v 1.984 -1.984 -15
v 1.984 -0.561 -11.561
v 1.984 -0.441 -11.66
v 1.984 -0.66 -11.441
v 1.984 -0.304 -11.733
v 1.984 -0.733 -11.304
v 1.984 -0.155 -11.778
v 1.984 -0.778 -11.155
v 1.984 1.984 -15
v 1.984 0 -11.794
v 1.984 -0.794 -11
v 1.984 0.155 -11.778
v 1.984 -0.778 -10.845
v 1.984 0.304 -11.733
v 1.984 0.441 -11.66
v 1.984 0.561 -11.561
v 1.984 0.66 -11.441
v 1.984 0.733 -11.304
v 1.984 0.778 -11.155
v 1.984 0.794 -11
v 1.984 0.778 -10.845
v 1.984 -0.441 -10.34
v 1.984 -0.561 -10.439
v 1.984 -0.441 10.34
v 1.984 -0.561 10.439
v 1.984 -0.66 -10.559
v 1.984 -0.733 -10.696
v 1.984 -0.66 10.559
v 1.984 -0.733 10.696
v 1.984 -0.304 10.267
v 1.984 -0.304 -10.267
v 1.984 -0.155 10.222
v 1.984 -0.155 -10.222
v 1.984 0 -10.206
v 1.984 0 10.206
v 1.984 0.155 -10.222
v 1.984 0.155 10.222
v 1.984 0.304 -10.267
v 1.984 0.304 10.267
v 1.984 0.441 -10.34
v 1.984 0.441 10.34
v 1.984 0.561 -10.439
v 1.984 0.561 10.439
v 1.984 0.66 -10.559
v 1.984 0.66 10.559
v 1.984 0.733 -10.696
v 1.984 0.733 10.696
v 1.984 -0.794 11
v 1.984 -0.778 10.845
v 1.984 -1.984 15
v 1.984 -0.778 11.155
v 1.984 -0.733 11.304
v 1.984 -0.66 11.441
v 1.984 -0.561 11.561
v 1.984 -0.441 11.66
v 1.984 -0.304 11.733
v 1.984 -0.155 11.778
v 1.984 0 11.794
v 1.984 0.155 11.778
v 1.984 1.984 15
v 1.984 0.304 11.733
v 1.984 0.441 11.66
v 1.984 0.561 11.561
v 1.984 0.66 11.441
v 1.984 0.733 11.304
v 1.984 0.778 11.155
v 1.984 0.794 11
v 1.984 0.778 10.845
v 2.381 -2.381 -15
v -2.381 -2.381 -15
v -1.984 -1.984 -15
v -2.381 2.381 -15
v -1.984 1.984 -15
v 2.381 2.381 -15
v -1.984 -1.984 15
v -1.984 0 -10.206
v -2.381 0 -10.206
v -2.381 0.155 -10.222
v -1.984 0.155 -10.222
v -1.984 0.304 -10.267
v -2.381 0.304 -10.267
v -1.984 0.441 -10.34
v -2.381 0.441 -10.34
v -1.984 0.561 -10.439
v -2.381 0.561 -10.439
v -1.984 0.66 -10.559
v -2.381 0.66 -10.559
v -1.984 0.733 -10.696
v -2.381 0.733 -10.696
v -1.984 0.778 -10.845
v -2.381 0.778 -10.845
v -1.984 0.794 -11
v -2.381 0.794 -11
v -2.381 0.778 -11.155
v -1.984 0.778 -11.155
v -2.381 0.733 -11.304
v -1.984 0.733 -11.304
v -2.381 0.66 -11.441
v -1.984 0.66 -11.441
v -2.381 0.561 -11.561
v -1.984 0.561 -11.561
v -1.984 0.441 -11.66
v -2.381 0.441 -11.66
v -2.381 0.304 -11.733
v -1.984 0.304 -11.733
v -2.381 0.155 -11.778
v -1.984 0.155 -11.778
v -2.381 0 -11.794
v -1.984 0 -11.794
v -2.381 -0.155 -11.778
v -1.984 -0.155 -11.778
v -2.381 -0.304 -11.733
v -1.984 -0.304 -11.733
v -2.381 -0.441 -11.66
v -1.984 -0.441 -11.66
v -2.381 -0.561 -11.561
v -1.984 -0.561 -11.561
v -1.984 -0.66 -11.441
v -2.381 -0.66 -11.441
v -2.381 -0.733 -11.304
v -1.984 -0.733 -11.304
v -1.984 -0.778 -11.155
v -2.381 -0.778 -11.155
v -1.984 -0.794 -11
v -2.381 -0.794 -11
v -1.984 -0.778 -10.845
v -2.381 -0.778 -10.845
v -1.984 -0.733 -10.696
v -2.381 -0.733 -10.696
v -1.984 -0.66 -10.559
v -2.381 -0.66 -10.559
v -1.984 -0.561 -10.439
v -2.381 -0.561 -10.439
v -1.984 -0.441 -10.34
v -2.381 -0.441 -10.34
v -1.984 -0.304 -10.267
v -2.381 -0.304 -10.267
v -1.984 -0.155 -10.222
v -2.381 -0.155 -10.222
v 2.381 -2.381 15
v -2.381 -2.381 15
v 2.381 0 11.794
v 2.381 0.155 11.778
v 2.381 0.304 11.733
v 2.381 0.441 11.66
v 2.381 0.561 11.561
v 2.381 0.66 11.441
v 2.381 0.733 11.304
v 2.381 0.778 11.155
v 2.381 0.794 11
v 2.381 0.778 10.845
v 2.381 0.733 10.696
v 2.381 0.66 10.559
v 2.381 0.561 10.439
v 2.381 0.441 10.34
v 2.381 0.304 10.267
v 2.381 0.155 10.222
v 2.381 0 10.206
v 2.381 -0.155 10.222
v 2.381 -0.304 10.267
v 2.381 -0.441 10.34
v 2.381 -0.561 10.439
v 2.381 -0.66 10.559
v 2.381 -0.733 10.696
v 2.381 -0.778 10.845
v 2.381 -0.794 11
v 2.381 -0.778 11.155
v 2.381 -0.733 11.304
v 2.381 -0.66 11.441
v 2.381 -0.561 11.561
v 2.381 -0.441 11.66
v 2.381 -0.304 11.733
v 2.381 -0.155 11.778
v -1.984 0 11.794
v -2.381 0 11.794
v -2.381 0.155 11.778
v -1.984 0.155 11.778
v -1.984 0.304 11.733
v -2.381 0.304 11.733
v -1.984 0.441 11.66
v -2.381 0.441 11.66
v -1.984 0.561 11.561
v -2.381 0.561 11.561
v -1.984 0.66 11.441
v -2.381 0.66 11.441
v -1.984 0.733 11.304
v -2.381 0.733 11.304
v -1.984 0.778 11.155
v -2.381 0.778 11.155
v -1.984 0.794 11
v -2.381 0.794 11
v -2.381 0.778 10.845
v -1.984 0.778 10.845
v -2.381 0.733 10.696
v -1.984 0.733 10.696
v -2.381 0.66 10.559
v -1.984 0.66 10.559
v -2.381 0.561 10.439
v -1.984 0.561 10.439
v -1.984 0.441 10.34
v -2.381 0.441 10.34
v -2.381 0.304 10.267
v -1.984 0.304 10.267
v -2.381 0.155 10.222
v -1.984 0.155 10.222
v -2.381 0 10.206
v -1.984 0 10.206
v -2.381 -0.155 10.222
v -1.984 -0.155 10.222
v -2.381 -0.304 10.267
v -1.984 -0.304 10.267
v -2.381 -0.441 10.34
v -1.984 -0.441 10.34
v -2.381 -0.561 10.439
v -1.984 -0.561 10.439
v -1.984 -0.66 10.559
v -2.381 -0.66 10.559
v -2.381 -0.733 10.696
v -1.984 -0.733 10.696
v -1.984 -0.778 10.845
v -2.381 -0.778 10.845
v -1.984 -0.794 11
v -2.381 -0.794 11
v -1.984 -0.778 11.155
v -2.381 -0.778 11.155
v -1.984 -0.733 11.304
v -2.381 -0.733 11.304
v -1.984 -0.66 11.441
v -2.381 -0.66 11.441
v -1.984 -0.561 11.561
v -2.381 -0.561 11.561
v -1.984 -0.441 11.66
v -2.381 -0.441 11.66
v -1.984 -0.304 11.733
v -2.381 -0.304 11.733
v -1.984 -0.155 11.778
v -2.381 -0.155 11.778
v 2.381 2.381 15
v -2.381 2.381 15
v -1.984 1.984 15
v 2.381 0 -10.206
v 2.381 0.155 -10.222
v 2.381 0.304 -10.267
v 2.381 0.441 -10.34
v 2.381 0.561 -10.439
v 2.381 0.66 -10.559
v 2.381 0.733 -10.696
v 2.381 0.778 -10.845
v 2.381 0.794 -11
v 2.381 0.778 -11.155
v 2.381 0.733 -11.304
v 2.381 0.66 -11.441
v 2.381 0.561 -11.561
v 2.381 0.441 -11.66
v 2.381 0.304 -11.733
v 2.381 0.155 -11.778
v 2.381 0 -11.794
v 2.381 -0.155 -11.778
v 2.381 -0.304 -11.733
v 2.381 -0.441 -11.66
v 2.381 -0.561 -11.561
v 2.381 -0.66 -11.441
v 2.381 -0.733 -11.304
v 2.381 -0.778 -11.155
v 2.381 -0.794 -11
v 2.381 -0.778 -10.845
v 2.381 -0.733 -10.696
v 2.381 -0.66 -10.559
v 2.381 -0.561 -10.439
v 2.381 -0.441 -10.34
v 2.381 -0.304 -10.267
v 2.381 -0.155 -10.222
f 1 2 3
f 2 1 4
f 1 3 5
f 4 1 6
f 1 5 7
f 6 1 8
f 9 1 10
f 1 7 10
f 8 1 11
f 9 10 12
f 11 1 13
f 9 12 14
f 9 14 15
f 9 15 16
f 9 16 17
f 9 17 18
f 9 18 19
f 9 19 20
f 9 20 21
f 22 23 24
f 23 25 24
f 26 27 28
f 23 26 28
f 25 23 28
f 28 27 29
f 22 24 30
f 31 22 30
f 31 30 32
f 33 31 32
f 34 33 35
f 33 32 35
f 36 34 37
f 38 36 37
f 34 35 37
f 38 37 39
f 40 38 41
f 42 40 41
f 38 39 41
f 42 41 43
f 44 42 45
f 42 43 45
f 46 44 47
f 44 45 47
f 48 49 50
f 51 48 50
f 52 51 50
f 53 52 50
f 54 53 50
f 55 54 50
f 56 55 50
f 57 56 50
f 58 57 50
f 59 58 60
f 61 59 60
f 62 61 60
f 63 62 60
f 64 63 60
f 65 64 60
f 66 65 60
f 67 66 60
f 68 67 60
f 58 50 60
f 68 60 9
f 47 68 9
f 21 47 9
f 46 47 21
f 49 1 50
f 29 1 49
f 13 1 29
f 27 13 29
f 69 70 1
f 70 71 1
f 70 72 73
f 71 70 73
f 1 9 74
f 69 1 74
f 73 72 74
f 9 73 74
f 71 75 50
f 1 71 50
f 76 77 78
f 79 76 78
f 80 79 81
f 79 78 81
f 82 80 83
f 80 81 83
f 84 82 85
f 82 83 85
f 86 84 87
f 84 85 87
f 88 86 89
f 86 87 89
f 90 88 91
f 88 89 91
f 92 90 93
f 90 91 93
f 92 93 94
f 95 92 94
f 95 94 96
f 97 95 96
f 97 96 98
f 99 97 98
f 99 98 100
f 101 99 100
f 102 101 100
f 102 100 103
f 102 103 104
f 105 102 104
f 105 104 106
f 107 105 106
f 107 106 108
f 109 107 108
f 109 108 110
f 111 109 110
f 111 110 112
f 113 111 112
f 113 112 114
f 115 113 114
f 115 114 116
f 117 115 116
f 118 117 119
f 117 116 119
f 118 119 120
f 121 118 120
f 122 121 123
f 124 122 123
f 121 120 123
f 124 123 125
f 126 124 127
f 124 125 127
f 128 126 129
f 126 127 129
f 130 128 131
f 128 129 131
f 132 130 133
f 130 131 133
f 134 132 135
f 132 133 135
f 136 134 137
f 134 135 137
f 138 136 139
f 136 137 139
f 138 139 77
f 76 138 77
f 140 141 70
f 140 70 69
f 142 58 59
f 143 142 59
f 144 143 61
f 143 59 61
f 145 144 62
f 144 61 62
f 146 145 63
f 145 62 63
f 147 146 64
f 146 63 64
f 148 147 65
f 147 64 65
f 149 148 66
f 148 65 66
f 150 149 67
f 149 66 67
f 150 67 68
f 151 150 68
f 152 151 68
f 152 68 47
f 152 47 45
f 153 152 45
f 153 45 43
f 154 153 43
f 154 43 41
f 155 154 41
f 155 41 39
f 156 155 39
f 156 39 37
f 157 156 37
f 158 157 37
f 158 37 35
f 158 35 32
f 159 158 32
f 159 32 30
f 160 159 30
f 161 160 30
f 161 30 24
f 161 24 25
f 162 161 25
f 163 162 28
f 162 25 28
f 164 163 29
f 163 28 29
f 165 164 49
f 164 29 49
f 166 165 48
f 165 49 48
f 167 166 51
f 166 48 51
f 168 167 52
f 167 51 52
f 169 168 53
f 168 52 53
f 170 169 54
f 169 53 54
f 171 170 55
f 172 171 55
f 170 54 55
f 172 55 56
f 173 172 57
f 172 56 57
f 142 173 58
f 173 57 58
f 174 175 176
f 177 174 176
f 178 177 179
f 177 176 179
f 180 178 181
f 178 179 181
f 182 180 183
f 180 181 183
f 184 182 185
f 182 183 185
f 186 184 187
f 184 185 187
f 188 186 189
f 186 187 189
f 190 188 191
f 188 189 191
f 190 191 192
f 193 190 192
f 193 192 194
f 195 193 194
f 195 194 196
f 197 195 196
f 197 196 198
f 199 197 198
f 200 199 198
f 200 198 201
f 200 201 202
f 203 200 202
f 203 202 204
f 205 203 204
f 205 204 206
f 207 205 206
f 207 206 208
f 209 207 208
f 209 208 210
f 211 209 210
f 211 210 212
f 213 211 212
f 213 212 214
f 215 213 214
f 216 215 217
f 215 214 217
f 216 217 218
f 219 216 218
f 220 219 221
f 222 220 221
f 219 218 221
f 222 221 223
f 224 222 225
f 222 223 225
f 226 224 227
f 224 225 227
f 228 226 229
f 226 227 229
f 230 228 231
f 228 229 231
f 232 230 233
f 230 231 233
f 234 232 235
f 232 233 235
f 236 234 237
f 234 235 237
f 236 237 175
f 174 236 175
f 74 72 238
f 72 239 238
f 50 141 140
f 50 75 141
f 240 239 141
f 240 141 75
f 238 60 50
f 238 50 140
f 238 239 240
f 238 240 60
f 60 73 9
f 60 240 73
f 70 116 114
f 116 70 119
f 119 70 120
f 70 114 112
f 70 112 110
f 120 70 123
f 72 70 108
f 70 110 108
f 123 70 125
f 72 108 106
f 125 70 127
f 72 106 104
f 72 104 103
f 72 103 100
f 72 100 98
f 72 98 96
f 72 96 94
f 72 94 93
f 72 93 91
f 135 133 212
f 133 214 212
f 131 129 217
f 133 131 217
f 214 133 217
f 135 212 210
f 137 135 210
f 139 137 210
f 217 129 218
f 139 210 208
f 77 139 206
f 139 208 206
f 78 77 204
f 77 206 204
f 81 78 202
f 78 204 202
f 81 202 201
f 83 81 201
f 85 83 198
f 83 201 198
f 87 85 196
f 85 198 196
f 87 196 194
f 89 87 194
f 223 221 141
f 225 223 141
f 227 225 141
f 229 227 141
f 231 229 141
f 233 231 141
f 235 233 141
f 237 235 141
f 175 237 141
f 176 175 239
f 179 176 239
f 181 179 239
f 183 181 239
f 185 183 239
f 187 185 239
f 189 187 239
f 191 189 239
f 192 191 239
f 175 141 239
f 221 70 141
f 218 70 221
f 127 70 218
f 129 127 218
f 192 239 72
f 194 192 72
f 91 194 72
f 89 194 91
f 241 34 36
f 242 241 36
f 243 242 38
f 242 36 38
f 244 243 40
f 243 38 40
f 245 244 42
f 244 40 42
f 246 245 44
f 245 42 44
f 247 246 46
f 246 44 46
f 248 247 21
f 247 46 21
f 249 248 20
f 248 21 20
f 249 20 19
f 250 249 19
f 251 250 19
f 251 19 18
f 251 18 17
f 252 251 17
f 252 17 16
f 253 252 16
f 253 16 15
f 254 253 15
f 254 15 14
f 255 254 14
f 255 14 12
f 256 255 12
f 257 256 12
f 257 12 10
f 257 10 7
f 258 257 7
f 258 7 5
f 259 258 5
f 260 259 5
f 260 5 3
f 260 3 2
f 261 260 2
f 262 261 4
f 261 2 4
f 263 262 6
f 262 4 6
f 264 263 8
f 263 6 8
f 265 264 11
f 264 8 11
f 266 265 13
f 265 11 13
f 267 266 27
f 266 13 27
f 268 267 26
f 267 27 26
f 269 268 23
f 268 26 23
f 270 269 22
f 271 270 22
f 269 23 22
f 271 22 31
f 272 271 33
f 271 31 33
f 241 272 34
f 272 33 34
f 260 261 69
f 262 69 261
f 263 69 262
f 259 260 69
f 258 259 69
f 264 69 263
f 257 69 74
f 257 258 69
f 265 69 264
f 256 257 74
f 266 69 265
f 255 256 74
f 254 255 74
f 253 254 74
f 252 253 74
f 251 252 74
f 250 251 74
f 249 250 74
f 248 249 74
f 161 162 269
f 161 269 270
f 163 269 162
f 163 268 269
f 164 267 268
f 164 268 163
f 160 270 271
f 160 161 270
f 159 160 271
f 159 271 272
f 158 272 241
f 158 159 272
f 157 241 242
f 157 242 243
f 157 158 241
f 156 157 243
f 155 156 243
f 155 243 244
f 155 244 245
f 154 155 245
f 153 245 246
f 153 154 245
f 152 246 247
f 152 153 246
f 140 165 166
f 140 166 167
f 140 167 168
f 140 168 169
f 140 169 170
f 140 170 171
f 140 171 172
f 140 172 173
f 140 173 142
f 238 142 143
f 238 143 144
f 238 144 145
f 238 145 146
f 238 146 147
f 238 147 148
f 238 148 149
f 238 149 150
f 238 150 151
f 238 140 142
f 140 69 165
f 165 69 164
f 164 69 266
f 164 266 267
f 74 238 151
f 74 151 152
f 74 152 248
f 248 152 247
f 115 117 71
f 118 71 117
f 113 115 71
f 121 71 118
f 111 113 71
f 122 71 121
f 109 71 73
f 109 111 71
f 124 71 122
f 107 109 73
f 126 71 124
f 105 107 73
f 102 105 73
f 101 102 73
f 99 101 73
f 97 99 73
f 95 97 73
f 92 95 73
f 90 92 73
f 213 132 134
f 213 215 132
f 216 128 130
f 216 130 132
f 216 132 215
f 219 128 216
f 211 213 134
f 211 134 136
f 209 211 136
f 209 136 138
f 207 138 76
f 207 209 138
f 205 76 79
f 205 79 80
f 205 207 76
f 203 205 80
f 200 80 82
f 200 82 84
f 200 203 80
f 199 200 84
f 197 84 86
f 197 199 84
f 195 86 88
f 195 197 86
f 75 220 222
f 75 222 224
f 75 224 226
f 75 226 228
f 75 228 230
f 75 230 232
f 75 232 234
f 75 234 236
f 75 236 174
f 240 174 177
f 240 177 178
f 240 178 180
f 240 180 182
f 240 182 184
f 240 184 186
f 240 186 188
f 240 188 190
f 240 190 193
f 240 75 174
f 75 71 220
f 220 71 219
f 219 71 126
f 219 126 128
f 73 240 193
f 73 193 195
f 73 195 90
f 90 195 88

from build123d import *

# Parameters (mm, degrees)
SKETCH1_W           = 4.7625
SKETCH1_H           = 4.7625
SKETCH1_W_2         = 3.96875
SKETCH1_H_2         = 3.96875
BOSS_EXTRUDE1_DEPTH = 15
SKETCH2_R           = 0.79375
CUT_EXTRUDE1_DEPTH  = 16.917027292


with BuildPart() as part:
    # Sketch1 → Boss-Extrude1 (new, symmetric)
    with BuildSketch(Plane.XY):
        Rectangle(SKETCH1_W, SKETCH1_H)
        Rectangle(SKETCH1_W_2, SKETCH1_H_2, mode=Mode.SUBTRACT)
    extrude(amount=BOSS_EXTRUDE1_DEPTH, both=True)

    # Sketch2 → Cut-Extrude1 (cut, through all)
    with BuildSketch(Plane.ZY.offset(2.38125)):
        with Locations((-11, 0)):
            Circle(SKETCH2_R)
        with Locations((11, 0)):
            Circle(SKETCH2_R)
    extrude(amount=-CUT_EXTRUDE1_DEPTH, mode=Mode.SUBTRACT)


solid = part.part
